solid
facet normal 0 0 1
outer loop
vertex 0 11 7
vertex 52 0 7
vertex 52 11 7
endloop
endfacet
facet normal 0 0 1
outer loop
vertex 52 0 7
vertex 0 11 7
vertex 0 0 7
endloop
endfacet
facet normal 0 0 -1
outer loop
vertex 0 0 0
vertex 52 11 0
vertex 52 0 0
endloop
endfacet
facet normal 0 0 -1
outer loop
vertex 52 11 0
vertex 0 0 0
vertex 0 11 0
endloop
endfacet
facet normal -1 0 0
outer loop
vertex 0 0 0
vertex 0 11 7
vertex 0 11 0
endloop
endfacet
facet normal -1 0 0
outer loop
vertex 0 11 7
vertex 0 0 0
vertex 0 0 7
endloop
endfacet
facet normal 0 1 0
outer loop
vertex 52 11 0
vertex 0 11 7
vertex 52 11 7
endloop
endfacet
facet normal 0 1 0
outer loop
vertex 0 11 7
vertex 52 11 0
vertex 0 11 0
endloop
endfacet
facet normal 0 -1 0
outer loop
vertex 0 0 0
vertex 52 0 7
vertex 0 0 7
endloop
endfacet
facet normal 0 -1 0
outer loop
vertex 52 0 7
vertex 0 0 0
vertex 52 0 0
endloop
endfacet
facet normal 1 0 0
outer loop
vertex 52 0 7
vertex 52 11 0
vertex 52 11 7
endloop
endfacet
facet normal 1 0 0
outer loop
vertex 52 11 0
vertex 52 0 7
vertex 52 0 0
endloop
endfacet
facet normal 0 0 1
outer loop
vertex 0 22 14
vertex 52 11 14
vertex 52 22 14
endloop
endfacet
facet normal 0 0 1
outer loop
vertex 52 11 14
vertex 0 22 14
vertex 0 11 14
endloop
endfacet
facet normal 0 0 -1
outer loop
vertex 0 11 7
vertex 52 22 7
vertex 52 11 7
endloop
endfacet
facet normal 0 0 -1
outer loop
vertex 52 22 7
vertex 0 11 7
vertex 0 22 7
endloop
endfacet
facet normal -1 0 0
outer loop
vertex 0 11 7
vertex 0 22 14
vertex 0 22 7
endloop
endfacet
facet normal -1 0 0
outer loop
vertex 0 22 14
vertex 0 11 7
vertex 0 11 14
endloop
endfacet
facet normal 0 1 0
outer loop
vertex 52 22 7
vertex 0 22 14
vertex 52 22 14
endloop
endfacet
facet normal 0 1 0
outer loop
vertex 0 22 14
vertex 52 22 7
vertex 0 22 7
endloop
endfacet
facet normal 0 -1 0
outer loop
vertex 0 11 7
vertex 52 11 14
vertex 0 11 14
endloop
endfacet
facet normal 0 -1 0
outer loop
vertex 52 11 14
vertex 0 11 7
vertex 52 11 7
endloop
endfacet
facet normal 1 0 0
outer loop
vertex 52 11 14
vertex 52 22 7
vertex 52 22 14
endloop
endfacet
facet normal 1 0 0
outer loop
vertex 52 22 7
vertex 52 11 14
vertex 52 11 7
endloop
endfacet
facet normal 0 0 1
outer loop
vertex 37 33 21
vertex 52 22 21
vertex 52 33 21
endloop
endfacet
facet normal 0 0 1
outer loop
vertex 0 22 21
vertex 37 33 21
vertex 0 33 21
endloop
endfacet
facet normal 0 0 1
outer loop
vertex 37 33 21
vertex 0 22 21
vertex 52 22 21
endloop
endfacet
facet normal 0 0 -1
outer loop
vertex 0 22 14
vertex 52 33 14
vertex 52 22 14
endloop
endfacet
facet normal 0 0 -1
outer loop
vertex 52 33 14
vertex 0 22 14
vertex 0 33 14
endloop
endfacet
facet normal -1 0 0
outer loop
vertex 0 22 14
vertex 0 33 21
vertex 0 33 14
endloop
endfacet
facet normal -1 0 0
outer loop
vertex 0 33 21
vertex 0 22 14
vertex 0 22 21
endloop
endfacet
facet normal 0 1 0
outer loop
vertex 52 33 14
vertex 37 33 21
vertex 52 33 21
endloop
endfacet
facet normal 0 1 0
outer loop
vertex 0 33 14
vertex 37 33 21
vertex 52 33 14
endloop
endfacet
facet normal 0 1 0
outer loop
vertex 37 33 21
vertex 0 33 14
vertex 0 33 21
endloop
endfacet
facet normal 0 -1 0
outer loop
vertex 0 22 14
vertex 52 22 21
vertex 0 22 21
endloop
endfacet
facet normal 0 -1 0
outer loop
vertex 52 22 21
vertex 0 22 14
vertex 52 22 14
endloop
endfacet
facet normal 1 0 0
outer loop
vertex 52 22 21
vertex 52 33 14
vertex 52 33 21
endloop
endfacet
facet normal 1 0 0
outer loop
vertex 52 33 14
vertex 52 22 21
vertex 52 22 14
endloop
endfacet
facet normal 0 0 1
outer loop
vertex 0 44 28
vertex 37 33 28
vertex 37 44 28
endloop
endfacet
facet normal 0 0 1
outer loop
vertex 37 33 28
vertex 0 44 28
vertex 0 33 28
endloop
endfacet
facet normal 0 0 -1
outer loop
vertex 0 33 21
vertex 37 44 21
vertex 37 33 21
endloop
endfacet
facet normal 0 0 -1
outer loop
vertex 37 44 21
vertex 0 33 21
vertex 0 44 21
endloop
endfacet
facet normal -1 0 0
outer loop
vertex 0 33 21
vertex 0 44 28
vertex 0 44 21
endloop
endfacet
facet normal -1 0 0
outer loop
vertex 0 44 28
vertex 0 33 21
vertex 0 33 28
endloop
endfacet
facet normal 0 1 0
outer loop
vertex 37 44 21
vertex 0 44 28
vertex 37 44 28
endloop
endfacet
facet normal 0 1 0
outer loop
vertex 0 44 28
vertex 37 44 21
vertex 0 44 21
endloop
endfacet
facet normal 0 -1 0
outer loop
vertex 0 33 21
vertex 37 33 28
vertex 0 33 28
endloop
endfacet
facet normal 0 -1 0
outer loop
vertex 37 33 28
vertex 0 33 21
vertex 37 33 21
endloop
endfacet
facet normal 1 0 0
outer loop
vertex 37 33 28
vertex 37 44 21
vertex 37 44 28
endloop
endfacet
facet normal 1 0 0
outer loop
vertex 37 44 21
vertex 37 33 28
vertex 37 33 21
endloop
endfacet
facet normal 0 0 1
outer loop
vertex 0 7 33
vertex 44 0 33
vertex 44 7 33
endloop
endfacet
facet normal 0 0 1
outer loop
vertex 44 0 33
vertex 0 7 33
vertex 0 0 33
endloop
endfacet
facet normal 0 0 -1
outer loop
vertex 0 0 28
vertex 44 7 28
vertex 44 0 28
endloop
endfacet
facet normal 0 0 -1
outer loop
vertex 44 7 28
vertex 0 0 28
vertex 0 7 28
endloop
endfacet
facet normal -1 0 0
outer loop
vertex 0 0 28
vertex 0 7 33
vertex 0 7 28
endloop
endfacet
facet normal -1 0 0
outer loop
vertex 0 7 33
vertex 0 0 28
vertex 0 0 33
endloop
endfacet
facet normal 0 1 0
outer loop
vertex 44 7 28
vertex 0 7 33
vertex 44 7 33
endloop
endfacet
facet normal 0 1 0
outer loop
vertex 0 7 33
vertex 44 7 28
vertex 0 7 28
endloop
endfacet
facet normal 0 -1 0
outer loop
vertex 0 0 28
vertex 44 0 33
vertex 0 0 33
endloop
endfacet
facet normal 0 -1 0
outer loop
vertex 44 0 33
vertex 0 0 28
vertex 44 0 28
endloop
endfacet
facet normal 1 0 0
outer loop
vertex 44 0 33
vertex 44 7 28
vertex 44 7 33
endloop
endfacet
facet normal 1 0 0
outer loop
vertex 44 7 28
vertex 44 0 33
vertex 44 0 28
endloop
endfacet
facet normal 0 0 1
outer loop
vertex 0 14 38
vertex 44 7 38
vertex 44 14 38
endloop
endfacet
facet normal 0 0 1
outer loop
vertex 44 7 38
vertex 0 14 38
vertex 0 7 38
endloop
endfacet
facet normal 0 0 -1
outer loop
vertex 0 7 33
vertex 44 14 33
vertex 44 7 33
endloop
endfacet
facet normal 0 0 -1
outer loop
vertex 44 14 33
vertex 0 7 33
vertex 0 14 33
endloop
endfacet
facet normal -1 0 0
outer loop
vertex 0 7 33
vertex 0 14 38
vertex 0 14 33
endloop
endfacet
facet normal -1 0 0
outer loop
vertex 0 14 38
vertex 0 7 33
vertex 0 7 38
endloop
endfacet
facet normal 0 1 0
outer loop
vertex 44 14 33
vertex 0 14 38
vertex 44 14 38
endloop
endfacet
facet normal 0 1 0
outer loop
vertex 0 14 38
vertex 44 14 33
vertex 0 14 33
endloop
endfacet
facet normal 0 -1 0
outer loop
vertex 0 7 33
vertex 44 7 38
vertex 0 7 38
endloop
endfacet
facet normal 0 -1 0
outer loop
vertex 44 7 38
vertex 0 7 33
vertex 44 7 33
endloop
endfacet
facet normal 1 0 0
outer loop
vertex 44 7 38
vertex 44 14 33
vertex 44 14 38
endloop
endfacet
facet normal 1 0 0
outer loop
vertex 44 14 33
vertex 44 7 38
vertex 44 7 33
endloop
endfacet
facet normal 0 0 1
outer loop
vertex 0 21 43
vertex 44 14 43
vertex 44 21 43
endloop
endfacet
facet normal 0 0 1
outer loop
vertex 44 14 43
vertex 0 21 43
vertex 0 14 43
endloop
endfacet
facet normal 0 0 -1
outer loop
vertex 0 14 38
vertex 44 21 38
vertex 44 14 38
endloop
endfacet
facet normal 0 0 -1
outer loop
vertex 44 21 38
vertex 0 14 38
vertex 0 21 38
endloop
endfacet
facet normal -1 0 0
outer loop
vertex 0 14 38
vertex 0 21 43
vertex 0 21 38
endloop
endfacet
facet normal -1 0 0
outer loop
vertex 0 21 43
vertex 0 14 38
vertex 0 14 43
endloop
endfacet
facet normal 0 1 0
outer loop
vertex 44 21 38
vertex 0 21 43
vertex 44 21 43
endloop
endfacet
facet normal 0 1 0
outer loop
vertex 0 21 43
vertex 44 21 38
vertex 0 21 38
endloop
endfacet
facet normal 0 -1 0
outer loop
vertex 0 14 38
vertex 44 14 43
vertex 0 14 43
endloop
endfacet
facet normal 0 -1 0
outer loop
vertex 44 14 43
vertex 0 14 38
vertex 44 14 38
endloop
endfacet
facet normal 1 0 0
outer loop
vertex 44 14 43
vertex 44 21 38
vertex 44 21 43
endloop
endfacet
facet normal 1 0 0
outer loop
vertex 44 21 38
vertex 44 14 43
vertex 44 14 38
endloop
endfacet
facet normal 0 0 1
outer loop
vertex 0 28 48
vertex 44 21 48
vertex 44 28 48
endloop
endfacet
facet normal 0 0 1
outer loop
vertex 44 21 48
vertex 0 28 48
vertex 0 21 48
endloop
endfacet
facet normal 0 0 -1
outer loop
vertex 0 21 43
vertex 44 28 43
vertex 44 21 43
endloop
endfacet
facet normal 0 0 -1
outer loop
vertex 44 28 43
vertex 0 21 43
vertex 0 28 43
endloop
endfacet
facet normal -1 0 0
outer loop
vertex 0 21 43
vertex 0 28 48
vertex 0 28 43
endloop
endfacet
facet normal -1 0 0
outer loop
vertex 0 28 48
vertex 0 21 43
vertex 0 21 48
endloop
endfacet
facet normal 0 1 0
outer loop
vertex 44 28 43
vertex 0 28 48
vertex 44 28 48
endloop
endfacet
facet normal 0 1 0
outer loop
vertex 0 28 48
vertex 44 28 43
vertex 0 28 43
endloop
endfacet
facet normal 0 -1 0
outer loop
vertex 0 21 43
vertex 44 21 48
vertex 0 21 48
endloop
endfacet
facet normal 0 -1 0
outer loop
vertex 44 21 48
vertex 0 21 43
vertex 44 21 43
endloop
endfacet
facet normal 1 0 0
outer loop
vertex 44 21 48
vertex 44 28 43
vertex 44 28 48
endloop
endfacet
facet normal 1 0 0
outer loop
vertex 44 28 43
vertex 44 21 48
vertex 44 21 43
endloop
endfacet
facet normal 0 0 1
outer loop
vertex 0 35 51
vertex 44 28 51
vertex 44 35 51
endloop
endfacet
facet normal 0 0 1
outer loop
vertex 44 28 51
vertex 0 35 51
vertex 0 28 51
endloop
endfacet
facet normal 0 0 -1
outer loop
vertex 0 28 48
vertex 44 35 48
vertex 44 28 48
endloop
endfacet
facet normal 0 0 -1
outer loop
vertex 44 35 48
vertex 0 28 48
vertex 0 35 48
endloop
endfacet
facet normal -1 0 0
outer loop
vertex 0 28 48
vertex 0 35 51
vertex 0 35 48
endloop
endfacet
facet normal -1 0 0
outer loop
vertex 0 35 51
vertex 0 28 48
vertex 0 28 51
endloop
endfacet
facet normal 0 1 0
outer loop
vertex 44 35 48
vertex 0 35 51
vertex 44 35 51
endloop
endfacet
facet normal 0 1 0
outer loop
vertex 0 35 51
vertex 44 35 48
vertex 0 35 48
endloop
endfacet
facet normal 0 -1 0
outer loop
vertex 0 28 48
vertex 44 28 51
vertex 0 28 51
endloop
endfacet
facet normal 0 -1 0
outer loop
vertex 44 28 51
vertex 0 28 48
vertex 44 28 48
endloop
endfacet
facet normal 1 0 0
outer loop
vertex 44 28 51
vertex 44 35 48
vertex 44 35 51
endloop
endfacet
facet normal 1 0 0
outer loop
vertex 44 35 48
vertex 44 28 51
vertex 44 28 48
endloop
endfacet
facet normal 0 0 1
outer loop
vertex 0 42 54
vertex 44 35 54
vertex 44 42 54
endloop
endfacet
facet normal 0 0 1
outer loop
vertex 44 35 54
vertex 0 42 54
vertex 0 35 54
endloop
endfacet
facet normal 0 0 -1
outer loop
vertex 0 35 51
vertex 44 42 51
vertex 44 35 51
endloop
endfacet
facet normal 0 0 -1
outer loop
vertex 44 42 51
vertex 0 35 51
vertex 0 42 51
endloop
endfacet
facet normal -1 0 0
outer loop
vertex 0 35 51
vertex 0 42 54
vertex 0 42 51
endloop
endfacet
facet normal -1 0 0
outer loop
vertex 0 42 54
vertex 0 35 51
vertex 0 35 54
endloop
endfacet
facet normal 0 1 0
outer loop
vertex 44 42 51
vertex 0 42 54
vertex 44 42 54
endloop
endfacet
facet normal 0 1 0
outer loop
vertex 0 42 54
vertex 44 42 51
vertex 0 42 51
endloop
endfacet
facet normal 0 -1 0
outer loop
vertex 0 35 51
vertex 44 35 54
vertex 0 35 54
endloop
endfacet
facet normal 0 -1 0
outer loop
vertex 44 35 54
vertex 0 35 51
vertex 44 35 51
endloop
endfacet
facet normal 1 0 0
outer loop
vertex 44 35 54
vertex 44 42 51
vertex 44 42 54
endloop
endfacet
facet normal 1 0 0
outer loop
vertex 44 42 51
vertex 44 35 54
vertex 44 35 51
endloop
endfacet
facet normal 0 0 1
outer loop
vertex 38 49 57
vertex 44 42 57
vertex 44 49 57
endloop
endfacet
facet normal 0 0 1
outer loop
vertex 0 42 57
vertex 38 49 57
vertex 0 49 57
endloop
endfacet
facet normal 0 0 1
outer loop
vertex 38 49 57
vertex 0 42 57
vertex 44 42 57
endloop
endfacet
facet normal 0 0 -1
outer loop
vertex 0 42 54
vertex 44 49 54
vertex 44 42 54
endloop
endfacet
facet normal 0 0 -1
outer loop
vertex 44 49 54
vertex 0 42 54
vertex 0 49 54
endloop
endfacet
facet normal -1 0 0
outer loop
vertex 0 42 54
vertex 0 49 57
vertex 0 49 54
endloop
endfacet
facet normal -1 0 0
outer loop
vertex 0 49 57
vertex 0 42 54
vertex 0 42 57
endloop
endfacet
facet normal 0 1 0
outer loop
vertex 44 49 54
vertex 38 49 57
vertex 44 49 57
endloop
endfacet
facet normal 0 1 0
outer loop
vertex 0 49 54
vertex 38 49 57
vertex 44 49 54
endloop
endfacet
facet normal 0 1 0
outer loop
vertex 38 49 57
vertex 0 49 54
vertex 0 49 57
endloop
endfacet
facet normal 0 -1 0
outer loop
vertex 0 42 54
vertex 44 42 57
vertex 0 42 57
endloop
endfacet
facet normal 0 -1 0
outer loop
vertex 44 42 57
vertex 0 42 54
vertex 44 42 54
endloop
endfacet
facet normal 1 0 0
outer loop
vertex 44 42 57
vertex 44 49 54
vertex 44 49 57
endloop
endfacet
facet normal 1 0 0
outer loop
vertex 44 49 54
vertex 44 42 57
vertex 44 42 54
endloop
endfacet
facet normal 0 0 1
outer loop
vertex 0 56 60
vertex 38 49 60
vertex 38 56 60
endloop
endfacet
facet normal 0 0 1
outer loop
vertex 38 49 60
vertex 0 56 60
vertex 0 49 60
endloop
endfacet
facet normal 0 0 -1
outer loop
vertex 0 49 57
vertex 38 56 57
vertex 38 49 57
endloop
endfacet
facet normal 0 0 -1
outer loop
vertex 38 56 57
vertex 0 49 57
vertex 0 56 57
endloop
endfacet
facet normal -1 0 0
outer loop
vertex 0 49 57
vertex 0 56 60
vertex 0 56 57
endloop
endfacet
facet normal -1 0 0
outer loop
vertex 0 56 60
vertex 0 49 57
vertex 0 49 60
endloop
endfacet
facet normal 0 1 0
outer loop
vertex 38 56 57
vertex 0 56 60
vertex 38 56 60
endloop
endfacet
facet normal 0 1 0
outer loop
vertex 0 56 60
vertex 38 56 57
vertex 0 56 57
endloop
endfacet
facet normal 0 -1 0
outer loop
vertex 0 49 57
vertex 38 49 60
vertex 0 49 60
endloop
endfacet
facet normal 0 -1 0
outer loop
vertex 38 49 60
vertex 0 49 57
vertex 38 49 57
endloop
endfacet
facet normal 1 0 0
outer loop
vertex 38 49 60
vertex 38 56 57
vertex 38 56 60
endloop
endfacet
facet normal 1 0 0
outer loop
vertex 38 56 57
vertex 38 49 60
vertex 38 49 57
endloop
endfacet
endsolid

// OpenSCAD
translate([6.5, 5.5, 3.5]) color([0.11344489563770899, 0.425970248072163, 0.5660129742477574]) cube([13, 11, 7], center=true);
translate([19.5, 5.5, 3.5]) color([0.9228805831375125, 0.9357547693309531, 0.41564119654091314]) cube([13, 11, 7], center=true);
translate([32.5, 5.5, 3.5]) color([0.0992109880980957, 0.7738187324714434, 0.7342793416571158]) cube([13, 11, 7], center=true);
translate([45.5, 5.5, 3.5]) color([0.03070084595190614, 0.4467185991338365, 0.6864181042985581]) cube([13, 11, 7], center=true);
translate([6.5, 16.5, 10.5]) color([0.030134234552269934, 0.9192823534016137, 0.9622424865104192]) cube([13, 11, 7], center=true);
translate([19.5, 16.5, 10.5]) color([0.72254277208884, 0.0785385396518038, 0.07032946587635569]) cube([13, 11, 7], center=true);
translate([32.5, 16.5, 10.5]) color([0.3592533148212369, 0.029377507756986443, 0.3478777272843395]) cube([13, 11, 7], center=true);
translate([45.5, 16.5, 10.5]) color([0.009964241312966027, 0.9743235128409679, 0.8190066990688627]) cube([13, 11, 7], center=true);
translate([6.5, 27.5, 17.5]) color([0.07051761147818736, 0.8934350918478603, 0.20797804000401565]) cube([13, 11, 7], center=true);
translate([19.5, 27.5, 17.5]) color([0.20479079826934998, 0.6737591455288341, 0.9382622681625481]) cube([13, 11, 7], center=true);
translate([32.5, 27.5, 17.5]) color([0.12318812122923739, 0.007184567252270457, 0.3691301471700257]) cube([13, 11, 7], center=true);
translate([45.5, 27.5, 17.5]) color([0.024650014436155776, 0.6048482375805311, 0.8591756086192088]) cube([13, 11, 7], center=true);
translate([6.5, 38.5, 24.5]) color([0.1869917024228578, 0.11239103583018406, 0.34444960733861085]) cube([13, 11, 7], center=true);
translate([19.5, 38.5, 24.5]) color([0.9591715206073138, 0.13015769442868408, 0.9665192604669938]) cube([13, 11, 7], center=true);
translate([31.5, 38.5, 24.5]) color([0.36223986994484925, 0.47337040276011155, 0.29263198596497353]) cube([11, 11, 7], center=true);
translate([5.5, 3.5, 30.5]) color([0.9371268442154698, 0.9581478949874975, 0.6359157065077434]) cube([11, 7, 5], center=true);
translate([16.5, 3.5, 30.5]) color([0.18404555017515556, 0.9929517886102871, 0.10258043954691198]) cube([11, 7, 5], center=true);
translate([27.5, 3.5, 30.5]) color([0.5808493815940804, 0.15640306008300875, 0.8976753141502056]) cube([11, 7, 5], center=true);
translate([38.5, 3.5, 30.5]) color([0.9456783914956152, 0.8043902980001079, 0.3158914186681244]) cube([11, 7, 5], center=true);
translate([5.5, 10.5, 35.5]) color([0.2428386899579852, 0.7548584132190378, 0.291059519145354]) cube([11, 7, 5], center=true);
translate([16.5, 10.5, 35.5]) color([0.4197853778540753, 0.04625567690264132, 0.13223381043380655]) cube([11, 7, 5], center=true);
translate([27.5, 10.5, 35.5]) color([0.020549620641776678, 0.0779211200935358, 0.07321114936486084]) cube([11, 7, 5], center=true);
translate([38.5, 10.5, 35.5]) color([0.42023170217414685, 0.5507771776374378, 0.740878819870922]) cube([11, 7, 5], center=true);
translate([5.5, 17.5, 40.5]) color([0.14228347384241602, 0.4221887461694188, 0.6369660374117204]) cube([11, 7, 5], center=true);
translate([16.5, 17.5, 40.5]) color([0.08455569481893255, 0.44481115514620384, 0.3692560392397978]) cube([11, 7, 5], center=true);
translate([27.5, 17.5, 40.5]) color([0.9489319289416618, 0.05785711390101722, 0.40862622118314806]) cube([11, 7, 5], center=true);
translate([38.5, 17.5, 40.5]) color([0.41722547979620506, 0.728180504599678, 0.3206710028745039]) cube([11, 7, 5], center=true);
translate([5.5, 24.5, 45.5]) color([0.20399027594623398, 0.2933116551663051, 0.4708875424493587]) cube([11, 7, 5], center=true);
translate([16.5, 24.5, 45.5]) color([0.9502683295716211, 0.7965170227633064, 0.2769702457797433]) cube([11, 7, 5], center=true);
translate([27.5, 24.5, 45.5]) color([0.5581815883930463, 0.6882003035685332, 0.7956571556821322]) cube([11, 7, 5], center=true);
translate([38.5, 24.5, 45.5]) color([0.4461643839498476, 0.398776905129706, 0.7676407428212785]) cube([11, 7, 5], center=true);
translate([5.5, 31.5, 49.5]) color([0.43171649556411207, 0.2479576688970051, 0.4534470315306477]) cube([11, 7, 3], center=true);
translate([16.5, 31.5, 49.5]) color([0.9371046462904561, 0.14256748821860132, 0.4624353545272121]) cube([11, 7, 3], center=true);
translate([27.5, 31.5, 49.5]) color([0.6373035243637815, 0.48328798826810027, 0.20363990437036994]) cube([11, 7, 3], center=true);
translate([38.5, 31.5, 49.5]) color([0.0018431606156659175, 0.698991711803439, 0.6187355180234525]) cube([11, 7, 3], center=true);
translate([5.5, 38.5, 52.5]) color([0.007776649435864202, 0.2985601210181208, 0.7686342595428415]) cube([11, 7, 3], center=true);
translate([16.5, 38.5, 52.5]) color([0.6289203785446209, 0.5452081159439722, 0.1562211098090489]) cube([11, 7, 3], center=true);
translate([27.5, 38.5, 52.5]) color([0.7062940429996885, 0.4714349217158037, 0.6781787462359636]) cube([11, 7, 3], center=true);
translate([38.5, 38.5, 52.5]) color([0.7600898367234922, 0.23236272144124515, 0.7619950130977117]) cube([11, 7, 3], center=true);
translate([5.5, 45.5, 55.5]) color([0.28008838468838926, 0.9840151371182455, 0.12083161078451865]) cube([11, 7, 3], center=true);
translate([16.5, 45.5, 55.5]) color([0.8837180187440564, 0.040547125043371324, 0.256575818348144]) cube([11, 7, 3], center=true);
translate([27.5, 45.5, 55.5]) color([0.5261019087624684, 0.5816161834445946, 0.3962349850280922]) cube([11, 7, 3], center=true);
translate([38.5, 45.5, 55.5]) color([0.10203172822707107, 0.2526080858247133, 0.28339650386048865]) cube([11, 7, 3], center=true);
translate([5.5, 52.5, 58.5]) color([0.7552228545587315, 0.9087743252220071, 0.5954099154864194]) cube([11, 7, 3], center=true);
translate([16.5, 52.5, 58.5]) color([0.03545096569102746, 0.7922364716417103, 0.30560393283991993]) cube([11, 7, 3], center=true);
translate([27.5, 52.5, 58.5]) color([0.33989040641624346, 0.5301854376454147, 0.24904704757555507]) cube([11, 7, 3], center=true);
translate([35.5, 52.5, 58.5]) color([0.9199780878573697, 0.1635547583408129, 0.41483040050373277]) cube([5, 7, 3], center=true);
